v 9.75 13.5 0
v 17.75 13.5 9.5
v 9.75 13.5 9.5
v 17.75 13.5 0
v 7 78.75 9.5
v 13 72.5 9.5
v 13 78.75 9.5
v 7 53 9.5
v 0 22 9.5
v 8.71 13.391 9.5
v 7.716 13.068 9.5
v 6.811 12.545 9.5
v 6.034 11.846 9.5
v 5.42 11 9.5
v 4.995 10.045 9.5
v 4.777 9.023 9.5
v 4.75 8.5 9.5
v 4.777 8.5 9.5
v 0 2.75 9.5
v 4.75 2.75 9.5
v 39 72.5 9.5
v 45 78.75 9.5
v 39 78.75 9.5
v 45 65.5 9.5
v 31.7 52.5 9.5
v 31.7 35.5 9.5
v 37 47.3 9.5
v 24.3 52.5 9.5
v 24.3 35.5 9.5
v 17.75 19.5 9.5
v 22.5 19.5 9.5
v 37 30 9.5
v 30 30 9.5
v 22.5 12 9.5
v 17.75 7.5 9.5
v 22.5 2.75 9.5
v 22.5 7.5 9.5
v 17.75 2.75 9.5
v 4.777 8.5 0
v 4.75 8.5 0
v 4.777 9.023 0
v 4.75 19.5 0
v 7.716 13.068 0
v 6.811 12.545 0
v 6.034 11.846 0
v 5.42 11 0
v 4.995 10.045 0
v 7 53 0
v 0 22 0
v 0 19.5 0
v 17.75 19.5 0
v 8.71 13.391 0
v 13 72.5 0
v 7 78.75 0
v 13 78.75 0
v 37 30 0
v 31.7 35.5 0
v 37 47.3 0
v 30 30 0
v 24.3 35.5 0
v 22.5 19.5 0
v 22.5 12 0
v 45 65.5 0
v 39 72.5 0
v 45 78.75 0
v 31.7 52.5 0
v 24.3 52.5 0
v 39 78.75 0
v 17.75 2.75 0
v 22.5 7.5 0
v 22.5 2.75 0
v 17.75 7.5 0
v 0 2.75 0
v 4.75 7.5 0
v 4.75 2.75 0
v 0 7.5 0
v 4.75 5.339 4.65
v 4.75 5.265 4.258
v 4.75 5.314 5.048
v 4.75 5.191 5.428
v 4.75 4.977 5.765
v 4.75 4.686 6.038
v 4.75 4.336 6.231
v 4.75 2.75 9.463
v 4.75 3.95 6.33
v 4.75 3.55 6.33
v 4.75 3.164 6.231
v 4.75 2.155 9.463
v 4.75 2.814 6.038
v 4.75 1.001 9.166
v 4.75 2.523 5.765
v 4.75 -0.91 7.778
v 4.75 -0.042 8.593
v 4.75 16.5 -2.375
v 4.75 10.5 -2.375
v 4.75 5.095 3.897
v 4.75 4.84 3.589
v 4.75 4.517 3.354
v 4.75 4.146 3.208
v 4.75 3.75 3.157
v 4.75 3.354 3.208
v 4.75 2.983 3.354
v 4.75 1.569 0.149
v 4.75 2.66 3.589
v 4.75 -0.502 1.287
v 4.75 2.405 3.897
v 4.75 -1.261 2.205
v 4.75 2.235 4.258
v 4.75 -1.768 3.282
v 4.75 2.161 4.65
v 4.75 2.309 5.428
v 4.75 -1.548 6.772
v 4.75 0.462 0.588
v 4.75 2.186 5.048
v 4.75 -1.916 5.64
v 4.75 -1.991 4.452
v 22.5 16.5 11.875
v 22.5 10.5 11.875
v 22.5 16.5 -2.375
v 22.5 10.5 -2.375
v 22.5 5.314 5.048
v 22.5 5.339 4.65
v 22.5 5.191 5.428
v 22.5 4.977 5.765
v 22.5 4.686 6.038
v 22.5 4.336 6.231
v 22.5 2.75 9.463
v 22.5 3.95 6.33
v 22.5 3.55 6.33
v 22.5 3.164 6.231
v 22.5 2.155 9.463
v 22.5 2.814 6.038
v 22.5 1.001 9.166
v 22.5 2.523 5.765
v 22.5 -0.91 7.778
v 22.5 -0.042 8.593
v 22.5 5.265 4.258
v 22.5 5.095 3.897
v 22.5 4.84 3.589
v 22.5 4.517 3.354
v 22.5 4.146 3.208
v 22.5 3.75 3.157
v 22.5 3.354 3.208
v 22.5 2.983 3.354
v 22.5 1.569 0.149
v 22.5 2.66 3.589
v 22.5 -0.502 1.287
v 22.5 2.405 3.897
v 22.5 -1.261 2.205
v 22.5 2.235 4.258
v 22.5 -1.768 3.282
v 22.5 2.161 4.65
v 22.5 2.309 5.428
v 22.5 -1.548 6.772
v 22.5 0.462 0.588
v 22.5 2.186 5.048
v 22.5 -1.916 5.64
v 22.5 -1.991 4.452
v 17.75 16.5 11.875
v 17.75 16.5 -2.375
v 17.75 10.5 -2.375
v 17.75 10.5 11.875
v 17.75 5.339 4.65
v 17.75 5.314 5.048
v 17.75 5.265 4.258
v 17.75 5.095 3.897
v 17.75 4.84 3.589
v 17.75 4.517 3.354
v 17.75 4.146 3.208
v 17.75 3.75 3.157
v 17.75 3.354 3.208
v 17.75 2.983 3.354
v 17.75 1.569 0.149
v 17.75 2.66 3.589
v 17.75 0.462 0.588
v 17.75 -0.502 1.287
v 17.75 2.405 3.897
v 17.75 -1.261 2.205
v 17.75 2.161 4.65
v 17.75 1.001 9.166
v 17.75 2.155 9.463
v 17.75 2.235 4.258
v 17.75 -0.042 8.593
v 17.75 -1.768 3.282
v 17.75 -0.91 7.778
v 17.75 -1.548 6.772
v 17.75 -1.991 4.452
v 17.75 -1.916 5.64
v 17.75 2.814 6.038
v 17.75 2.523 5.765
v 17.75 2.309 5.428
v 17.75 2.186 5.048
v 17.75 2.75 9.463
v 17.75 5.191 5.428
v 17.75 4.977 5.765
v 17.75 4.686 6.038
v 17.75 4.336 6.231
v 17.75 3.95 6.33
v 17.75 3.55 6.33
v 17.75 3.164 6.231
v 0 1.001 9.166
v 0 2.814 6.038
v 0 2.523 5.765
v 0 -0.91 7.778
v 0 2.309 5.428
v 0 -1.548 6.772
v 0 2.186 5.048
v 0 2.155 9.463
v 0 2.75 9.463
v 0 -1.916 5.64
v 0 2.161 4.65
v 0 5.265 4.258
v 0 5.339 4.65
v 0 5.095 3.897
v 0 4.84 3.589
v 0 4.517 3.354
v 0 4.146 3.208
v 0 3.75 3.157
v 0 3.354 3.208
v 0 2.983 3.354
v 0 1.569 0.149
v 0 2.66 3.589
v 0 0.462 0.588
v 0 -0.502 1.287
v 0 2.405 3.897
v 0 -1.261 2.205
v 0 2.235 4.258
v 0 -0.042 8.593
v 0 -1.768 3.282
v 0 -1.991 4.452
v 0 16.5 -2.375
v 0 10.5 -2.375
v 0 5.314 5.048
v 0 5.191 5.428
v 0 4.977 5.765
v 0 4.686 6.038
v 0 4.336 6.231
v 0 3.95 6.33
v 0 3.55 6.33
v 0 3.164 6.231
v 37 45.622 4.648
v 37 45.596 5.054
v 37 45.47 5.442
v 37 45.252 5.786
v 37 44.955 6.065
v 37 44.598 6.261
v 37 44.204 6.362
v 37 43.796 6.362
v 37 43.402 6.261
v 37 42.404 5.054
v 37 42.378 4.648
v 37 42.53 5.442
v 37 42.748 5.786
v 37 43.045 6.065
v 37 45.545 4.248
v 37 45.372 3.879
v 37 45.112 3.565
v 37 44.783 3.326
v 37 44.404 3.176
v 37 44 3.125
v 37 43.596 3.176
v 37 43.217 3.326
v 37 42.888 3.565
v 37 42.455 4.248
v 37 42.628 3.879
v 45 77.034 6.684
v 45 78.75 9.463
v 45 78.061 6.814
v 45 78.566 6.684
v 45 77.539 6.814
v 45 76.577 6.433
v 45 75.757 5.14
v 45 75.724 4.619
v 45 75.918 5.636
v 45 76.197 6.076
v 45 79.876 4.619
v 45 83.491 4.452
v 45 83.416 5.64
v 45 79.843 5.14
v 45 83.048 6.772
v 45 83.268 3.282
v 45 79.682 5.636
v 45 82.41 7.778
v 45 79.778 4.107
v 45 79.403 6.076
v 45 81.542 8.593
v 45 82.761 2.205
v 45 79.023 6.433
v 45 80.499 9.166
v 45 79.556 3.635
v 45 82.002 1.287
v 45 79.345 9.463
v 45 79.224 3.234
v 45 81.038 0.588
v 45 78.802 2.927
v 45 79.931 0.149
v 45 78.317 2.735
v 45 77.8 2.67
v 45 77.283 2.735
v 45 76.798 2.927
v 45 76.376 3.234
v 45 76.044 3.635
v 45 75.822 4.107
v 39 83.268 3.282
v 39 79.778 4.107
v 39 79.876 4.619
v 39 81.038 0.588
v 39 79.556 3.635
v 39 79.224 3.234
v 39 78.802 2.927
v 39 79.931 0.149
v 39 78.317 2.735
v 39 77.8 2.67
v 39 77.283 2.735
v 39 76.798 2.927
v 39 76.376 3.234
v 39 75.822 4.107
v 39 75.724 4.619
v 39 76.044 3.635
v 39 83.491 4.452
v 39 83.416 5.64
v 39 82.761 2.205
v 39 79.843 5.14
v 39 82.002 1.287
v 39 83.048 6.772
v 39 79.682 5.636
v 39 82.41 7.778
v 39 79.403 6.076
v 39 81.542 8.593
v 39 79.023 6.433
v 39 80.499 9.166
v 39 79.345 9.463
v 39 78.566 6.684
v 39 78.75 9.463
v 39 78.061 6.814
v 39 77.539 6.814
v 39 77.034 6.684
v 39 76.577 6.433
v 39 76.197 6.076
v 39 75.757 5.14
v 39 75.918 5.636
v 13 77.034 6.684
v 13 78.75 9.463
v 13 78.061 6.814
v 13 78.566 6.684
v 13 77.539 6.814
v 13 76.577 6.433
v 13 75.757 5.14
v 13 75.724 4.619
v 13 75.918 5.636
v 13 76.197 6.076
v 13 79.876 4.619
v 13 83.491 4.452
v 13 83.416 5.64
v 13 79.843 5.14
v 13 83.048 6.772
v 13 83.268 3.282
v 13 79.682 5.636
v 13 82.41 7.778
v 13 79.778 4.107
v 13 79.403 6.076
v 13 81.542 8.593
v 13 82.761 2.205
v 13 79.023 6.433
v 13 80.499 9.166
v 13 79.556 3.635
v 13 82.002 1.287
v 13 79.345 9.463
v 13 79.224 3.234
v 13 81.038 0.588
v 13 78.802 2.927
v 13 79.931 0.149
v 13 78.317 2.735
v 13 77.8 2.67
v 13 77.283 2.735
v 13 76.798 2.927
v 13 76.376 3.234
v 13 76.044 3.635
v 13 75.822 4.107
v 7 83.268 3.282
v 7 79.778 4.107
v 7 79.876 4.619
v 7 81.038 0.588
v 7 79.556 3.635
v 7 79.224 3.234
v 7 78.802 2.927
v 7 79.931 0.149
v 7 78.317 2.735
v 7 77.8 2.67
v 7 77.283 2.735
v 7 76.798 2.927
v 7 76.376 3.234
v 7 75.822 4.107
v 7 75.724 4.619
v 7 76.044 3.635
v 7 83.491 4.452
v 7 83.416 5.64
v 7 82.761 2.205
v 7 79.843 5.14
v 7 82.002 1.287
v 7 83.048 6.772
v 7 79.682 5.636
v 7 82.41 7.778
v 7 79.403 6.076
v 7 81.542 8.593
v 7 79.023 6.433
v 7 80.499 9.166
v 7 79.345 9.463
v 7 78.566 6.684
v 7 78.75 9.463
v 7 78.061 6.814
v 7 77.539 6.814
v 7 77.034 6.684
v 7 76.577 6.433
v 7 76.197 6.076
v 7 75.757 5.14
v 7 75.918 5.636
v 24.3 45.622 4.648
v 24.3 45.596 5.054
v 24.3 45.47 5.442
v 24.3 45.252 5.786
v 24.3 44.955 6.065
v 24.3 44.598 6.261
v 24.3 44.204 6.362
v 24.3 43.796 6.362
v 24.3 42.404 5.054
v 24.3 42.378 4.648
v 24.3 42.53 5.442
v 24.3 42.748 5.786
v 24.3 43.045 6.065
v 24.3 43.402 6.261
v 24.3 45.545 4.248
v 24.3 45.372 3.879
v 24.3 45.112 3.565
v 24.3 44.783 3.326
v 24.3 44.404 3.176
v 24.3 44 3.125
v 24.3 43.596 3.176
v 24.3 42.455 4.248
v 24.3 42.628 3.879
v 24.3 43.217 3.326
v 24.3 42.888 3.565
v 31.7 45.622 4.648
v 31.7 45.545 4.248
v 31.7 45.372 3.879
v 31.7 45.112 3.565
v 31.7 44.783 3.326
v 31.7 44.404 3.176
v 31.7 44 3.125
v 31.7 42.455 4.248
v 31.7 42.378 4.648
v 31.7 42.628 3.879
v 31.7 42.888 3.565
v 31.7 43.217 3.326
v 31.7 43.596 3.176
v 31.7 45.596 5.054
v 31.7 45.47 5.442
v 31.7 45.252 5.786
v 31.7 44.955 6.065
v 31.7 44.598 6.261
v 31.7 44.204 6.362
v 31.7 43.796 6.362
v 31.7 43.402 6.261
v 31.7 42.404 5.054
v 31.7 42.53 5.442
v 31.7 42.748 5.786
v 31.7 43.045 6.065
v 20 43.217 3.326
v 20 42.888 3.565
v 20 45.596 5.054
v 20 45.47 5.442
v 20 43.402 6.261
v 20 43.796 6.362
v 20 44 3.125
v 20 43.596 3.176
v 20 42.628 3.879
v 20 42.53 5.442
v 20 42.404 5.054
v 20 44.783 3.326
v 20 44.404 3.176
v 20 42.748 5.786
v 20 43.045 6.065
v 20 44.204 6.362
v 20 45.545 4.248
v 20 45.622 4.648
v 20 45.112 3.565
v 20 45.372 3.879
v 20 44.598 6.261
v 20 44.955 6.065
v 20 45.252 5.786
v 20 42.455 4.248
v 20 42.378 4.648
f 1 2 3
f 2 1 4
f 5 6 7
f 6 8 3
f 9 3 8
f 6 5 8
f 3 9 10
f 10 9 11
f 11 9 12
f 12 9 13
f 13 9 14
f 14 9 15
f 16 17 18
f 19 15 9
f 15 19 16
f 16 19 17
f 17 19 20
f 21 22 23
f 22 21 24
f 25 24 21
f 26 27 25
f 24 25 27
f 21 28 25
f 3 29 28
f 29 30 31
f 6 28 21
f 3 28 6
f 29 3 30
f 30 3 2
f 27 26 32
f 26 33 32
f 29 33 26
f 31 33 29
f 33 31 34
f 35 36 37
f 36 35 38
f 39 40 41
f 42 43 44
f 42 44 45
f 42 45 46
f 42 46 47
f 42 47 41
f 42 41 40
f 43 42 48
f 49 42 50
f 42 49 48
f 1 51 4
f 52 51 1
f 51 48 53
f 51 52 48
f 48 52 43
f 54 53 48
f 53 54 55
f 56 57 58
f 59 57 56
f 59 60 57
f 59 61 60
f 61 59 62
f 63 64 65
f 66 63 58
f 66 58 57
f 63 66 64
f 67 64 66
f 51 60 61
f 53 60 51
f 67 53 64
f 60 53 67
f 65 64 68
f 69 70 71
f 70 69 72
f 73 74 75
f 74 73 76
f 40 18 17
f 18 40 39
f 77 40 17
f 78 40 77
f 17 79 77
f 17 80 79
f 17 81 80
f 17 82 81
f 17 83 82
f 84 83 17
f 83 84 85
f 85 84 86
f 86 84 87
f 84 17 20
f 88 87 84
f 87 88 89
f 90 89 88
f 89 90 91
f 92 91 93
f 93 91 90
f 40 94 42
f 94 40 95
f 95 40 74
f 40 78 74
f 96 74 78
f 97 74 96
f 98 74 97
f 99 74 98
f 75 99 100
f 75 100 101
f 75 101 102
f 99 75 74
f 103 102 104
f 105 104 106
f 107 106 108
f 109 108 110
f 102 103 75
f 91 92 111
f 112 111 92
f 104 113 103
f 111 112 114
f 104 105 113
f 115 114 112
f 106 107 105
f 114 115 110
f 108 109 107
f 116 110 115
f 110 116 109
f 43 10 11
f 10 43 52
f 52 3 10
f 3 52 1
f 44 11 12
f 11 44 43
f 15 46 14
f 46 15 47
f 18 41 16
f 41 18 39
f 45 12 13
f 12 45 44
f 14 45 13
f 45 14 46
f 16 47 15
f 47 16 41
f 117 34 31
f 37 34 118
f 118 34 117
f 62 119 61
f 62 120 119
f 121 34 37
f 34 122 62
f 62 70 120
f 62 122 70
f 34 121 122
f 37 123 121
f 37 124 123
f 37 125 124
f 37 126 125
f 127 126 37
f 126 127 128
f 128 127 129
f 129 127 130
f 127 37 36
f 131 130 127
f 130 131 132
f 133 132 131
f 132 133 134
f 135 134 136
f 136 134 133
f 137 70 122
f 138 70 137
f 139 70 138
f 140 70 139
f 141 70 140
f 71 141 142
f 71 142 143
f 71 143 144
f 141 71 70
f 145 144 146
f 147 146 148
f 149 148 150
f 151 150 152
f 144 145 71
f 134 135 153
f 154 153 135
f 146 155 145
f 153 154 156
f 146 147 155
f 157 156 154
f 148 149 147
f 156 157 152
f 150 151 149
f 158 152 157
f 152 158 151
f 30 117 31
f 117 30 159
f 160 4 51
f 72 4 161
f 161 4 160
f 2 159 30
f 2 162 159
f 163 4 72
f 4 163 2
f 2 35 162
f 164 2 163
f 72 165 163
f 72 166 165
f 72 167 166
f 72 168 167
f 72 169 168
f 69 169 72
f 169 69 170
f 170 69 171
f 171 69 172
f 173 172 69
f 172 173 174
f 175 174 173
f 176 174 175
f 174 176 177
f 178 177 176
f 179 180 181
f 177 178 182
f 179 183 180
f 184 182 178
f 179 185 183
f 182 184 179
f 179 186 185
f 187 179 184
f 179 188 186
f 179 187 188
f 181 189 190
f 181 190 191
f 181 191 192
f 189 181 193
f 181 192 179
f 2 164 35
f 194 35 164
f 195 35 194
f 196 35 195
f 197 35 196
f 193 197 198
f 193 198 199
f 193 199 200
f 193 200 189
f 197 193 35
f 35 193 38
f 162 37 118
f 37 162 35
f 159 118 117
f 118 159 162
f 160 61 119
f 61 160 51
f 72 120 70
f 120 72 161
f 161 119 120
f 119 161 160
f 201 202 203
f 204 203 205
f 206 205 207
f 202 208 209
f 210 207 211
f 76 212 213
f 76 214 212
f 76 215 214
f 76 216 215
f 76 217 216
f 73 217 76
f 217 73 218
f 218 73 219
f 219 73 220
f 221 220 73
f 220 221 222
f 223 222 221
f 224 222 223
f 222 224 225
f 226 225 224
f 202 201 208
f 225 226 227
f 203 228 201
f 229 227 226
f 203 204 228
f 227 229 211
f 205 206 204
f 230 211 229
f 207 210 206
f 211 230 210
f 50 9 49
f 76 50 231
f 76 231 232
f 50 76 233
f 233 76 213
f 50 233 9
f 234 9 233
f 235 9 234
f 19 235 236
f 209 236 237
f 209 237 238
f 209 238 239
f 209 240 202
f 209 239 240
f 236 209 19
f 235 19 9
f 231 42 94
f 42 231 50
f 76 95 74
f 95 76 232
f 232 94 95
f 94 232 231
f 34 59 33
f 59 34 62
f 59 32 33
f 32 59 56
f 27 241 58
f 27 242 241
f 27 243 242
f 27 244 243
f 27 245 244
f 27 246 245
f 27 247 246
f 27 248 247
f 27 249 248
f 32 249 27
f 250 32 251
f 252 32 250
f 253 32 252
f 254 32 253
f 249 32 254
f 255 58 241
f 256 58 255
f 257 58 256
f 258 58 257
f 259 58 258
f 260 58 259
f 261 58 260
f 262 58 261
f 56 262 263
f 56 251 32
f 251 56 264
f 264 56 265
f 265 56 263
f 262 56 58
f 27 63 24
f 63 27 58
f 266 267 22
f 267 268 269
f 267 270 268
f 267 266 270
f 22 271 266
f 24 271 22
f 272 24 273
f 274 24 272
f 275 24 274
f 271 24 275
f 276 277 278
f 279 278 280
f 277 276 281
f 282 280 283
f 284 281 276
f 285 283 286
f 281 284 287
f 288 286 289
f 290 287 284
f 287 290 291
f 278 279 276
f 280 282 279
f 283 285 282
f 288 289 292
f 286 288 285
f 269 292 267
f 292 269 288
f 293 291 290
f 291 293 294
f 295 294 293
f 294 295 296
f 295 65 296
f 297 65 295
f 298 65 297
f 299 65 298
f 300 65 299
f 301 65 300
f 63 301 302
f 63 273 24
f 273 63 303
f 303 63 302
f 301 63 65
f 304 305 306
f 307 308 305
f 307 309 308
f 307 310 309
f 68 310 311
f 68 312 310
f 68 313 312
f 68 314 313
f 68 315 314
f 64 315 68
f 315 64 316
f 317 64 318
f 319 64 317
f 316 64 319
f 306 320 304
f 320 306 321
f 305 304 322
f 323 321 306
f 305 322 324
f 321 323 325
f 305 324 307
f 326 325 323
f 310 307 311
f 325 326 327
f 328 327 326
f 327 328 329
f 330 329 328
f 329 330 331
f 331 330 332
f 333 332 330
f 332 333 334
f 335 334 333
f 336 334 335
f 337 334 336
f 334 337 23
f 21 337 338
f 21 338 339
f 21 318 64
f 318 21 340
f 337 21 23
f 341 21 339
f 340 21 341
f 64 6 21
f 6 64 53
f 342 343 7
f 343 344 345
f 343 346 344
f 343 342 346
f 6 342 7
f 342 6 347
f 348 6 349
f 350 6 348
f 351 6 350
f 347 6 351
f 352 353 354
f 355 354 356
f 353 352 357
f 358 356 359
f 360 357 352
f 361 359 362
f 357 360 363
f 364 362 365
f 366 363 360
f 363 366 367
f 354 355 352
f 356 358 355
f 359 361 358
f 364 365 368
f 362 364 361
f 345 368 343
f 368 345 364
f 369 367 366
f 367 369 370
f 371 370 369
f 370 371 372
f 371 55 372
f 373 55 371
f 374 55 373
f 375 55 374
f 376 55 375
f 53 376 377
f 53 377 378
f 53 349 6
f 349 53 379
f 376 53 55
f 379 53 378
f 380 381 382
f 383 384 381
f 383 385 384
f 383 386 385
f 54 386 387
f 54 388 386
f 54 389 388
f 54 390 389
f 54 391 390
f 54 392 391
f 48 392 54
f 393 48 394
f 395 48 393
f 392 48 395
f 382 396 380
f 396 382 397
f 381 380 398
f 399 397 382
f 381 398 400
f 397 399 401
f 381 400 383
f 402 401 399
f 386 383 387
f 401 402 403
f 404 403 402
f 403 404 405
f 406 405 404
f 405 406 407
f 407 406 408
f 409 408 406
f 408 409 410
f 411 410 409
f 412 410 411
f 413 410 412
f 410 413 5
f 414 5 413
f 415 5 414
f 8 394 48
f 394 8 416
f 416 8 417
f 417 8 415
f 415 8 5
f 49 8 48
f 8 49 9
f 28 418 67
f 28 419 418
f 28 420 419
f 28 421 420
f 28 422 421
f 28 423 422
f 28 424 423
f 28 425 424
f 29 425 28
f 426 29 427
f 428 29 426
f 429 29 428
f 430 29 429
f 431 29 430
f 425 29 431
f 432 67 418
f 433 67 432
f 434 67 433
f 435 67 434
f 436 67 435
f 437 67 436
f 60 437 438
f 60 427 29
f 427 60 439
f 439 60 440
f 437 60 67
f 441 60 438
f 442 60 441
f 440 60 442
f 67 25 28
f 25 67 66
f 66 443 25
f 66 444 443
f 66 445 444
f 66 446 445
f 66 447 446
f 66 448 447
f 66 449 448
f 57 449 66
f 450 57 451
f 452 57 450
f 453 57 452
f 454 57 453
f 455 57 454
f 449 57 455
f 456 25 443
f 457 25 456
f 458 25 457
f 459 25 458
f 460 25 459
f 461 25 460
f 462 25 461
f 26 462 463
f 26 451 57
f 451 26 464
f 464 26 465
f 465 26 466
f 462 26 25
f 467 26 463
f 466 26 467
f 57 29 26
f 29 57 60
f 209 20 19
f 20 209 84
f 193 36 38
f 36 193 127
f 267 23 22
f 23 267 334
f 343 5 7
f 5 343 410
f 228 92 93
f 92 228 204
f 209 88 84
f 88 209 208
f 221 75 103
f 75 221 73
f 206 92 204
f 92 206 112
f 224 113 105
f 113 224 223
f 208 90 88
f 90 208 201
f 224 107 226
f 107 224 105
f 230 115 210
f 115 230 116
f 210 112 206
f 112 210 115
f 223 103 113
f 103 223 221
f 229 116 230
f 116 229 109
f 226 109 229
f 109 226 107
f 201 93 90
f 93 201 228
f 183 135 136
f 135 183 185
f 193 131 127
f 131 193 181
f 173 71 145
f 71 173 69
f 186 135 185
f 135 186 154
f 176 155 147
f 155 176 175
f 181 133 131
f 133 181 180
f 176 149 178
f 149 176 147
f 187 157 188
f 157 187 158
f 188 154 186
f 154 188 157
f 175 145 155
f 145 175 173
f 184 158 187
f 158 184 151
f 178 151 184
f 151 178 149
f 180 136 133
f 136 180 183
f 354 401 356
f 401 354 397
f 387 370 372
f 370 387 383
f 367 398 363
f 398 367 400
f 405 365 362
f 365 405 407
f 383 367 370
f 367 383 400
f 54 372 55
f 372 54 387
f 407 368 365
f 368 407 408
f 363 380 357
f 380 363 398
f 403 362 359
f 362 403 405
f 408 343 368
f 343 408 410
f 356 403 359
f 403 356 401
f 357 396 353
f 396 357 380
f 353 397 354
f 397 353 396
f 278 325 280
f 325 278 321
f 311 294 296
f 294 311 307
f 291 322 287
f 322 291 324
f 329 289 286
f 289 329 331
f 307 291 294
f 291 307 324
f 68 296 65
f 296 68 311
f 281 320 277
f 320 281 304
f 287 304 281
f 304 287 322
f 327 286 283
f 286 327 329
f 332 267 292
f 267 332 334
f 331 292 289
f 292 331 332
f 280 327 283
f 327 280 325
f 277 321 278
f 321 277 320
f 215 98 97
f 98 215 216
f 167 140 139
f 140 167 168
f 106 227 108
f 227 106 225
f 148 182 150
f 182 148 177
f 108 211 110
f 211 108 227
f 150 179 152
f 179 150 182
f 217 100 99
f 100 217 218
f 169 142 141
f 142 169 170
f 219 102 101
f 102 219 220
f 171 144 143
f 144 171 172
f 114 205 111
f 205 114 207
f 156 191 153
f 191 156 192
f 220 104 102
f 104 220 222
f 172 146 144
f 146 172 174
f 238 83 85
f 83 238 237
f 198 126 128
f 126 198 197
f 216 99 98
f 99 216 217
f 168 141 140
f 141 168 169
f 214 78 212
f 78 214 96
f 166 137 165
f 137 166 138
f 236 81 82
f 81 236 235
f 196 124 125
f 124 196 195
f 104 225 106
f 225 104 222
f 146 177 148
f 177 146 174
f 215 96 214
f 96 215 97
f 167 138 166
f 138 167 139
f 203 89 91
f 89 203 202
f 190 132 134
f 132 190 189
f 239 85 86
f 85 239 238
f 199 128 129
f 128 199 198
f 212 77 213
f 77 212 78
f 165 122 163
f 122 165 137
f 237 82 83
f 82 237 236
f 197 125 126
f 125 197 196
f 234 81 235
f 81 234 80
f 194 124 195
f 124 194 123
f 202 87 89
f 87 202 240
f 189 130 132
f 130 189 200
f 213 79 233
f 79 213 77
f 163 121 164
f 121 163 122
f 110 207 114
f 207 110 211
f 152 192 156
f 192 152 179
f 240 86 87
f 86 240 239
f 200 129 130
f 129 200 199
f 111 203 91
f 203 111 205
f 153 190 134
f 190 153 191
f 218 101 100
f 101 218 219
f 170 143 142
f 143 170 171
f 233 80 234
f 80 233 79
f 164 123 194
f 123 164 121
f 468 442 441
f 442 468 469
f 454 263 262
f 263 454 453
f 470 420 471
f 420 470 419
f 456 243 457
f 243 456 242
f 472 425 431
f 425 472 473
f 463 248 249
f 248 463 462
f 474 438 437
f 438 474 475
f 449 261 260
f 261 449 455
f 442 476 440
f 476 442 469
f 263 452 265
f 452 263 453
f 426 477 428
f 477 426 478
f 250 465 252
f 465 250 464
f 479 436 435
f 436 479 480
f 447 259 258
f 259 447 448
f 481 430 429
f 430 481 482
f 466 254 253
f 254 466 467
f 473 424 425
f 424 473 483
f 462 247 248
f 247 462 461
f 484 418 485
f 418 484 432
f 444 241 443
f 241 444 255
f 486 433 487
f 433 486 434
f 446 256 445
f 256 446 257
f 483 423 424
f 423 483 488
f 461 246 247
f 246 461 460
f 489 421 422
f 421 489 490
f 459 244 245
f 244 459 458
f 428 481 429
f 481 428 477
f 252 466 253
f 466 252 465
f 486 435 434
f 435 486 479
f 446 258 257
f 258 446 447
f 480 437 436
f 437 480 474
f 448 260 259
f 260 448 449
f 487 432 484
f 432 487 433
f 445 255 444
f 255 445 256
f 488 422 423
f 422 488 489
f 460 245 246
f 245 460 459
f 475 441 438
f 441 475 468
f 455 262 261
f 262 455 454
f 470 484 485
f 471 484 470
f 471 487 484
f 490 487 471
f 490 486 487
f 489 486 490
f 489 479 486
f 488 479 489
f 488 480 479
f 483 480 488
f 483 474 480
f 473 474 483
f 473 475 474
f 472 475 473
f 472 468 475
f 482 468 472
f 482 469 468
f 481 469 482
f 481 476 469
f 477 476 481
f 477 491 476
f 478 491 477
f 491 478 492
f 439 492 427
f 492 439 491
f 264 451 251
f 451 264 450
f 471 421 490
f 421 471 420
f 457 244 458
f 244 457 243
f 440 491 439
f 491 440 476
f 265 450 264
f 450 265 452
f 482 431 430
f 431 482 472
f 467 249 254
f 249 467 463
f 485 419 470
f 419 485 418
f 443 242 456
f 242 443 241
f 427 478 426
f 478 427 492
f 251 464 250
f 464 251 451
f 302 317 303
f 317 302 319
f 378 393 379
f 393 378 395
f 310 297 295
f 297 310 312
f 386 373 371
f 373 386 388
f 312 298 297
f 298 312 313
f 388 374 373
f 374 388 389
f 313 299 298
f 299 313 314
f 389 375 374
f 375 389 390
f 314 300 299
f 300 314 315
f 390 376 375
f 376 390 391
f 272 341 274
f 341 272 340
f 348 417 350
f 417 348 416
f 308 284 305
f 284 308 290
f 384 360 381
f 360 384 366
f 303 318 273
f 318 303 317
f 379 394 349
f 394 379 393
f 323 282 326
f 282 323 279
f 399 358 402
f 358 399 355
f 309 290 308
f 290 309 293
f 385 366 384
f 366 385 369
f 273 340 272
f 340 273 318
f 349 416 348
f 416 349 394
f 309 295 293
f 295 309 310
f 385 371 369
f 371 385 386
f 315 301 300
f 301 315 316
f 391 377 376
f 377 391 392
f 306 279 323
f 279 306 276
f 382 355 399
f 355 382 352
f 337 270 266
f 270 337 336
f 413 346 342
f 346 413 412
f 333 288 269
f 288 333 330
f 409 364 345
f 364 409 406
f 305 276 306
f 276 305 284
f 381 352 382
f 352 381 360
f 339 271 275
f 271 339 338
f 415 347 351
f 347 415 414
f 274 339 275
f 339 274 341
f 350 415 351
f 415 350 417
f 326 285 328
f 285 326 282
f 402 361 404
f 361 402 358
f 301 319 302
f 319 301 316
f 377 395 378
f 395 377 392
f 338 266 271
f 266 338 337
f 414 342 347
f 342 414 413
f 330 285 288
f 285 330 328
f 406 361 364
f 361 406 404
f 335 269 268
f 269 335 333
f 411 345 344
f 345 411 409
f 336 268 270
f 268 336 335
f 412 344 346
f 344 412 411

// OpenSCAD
// Traxxas Slash A Arm
//
// Replacement front A arm for the Traxxas Slash RC car.
// Parameters can be modified to use this A arm for the rear, or
// for other cars.
// (...it might need additional work to be used for the rear)
//
// V1 -> V2
// After driving with V1 for a while, printed in ABS,
// the A arm broke where it connects to the wheel. The back 
// connection snapped off (the whole little arm), and the front
// one split between layers, and the shaft got out. I made the following
// changes to these little arms
//      - For the front arm, the top is strengthened
//      - For the back arm, the inside was filleted
//      - For both, the bottom side was strengthened
//      - For both, the part holding the shaft was extended toward the wheel
//          (on the wheel side of the shaft - i.e. it's thicker)
//      - The dimension rodOneStraightTwo was created to move the vertex near
//          the back rod-one arm
//      - The dimension rodThreeVertex was created to move the vertex near 
//          the front rod three arm
//
// Daniel Winker, February 28, 2023

// Holes were coming out too small, so I added this multiplier
holeMult = 1.3;

// The long dimension
length = 83.5;

// The smallest dimension
thickness = 9.5;

// The largest width dimension; the "base of the A"
widest = 38;

// The narrowest width dimension; the "top of the A"
narrowest = 22.5;

// The "base of the A" is offset forward from the "top of the A" by this much
offset = 7.0;

// Forward distance between the "top of the A" and the shock-rod screwhead
shockRodOffset = 37.0;

// There are three rods going through the part
// They are referred to as one, two, and three
// One is by the wheel, two is for the shock, three is on the chassis
// Holes for the rods will be centered on the thickness axis, positioned
//    by 'Pos' on the length axis (0 is closest to rod 1), and go all 
//    the way through the other axis...except rod 2, which won't go all the way
// 'MountWidth' is the gap left by the pieces holding the rod.
// CutoutLength is the size of the gap left by the pieces holding the rod, along the length axis. Perpendicular to 'MountWidth'
// 'Inset' is unique to rod two, because it is not symmetrically placed like
//    the other two.
// 'HeadDia' is also unique to it (diameter of the screw head)
rodOneDia = 2.45 * holeMult;  // Actually the diameter of the hole, not the rod
rodOnePos = 3.75;
rodOneMountWidth = 13.0;
rodOneCutoutLength = 13.5;
rodOneBracketWidth = (narrowest-rodOneMountWidth)/2;

rodTwoDia = 2.5 * holeMult;
rodTwoPos = 44.0;
rodTwoMountWidth = 7.4;  // This should be 6.5, but it was printing almost 1mm small for me
rodTwoCutoutLength = 17.0;
rodTwoInset = 5.3;  // This should be larger...but it was printing ~1mm large for me
rodTwoHeadDia = 5.5;
rodTwoLen = 17;  // Length of the screw

rodThreeDia = 3.2 * holeMult;
rodThreePos = 77.8;
rodThreeMountWidth = 26;
rodThreeCutoutLength = 11.0;
rodThreeVertex = 18.0;  // Added in V2; position of the vertex from the end.
rodThreeBracketWidth = (widest - rodThreeMountWidth) / 2;

// I didn't have good ways to name these or describe them
// The arms holding the wheel-rod are straight for a bit before the A arm
// angles off - how long are those straight segments?
rodOneStraight = 12;
rodOneStraightTwo = 22;  // Added in V2
// On the front side of the arm, after the straight section, there's an
// angled section. What is the offset of the top of it?
angleOffset = 30;
// And what is the 'length' position of the top of it?
angleLen = 30;
// On the back section of the arm, there's a vertex near the car side (rod 3);
// what is the position of this in the length direction?
finalVertex = 53;

// V2 Values
// These specify the additions made in version 2
topReinforcementHeight = thickness * 0.25;
topReinforcementLength = rodOneStraight;
bottomReinforcementHeight = thickness * 0.25;
bottomReinforcementLength = rodOneStraight;
filletRadius = 5;
shaftReinforcementLength = 2;

// Draw a prism based on a right angled triangle
// l - length of prism
// w - width of triangle
// h - height of triangle
// https://github.com/dannystaple/OpenSCAD-Parts-Library/blob/master/prism.scad
module prism(l, w, h) {
       polyhedron(points=[
               [0,0,h],           // 0    front top corner
               [0,0,0],[w,0,0],   // 1, 2 front left & right bottom corners
               [0,l,h],           // 3    back top corner
               [0,l,0],[w,l,0]    // 4, 5 back left & right bottom corners
       ], faces=[ // points for all faces must be ordered clockwise when looking in
               [0,2,1],    // top face
               [3,4,5],    // base face
               [0,1,4,3],  // h face
               [1,2,5,4],  // w face
               [0,3,5,2],  // hypotenuse face
       ]);
}

// Create a 2D outline of the A arm then extrude it upwards
// This includes the cutout for the shock
// (Making it a module to organize the code)
module drawAARm() {
    linear_extrude(height=thickness, convexity=10, slices=20, scale=1.0, $fn=16) {
        polygon(points=[[0,0],
                        [rodOneBracketWidth,0],
                        [rodOneBracketWidth,rodOneCutoutLength],
                        [rodOneBracketWidth+rodOneMountWidth,rodOneCutoutLength],
                        [rodOneBracketWidth+rodOneMountWidth,0],
                        [narrowest,0],
                        [narrowest,rodOneStraight],
                        [angleOffset,angleLen],
                        [shockRodOffset,angleLen],
                        [shockRodOffset,rodTwoPos+0.6*rodTwoHeadDia],
                        [widest+offset,length-rodThreeVertex],
                        [widest+offset,length],
                        [widest+offset-rodThreeBracketWidth,length],
                        [widest+offset-rodThreeBracketWidth,length-rodThreeCutoutLength],
                        [offset+rodThreeBracketWidth,length-rodThreeCutoutLength],
                        [offset+rodThreeBracketWidth,length],
                        [offset,length],
                        [offset,finalVertex],
                        [0,rodOneStraightTwo],
                        // The points above are the outline
                        // The points below are the cutout for the shock
                        [shockRodOffset-rodTwoInset,rodTwoPos-rodTwoCutoutLength/2],
                        [shockRodOffset-rodTwoInset,rodTwoPos+rodTwoCutoutLength/2],
                        [shockRodOffset-rodTwoInset-rodTwoMountWidth,rodTwoPos+rodTwoCutoutLength/2],
                        [shockRodOffset-rodTwoInset-rodTwoMountWidth,rodTwoPos-rodTwoCutoutLength/2]],
                        // The below says the first set of points is for the outline
                        // and the second set is for the cutout
                        paths=[[0,1,2,3,4,5,6,7,8,9,10,11,12,13,14,15,16,17,18],
                               [19,20,21,22]]);
    }
}

// The A arm, from the module, has sharp 90-degree angles everywhere
// We want the end bits where the shafts go to be rounded
// So we cut off the rectangular bits, and draw in cylinders
// We also cut out holes for the shafts/rods
difference() {
    union() {
        // Cut out the 90-degree parts
        difference() {
            union() {
                drawAARm();
                
                // V2 Change: Add extra material on the wheel-side of
                // the A arm to strengthen the "rod one arm"
                rodOneArmWidth = (narrowest-rodOneMountWidth)/2;
                translate([0, -shaftReinforcementLength, 0]) {
                    cube([rodOneArmWidth,shaftReinforcementLength,thickness]);
                }
                translate([rodOneMountWidth+rodOneArmWidth, 
                            -shaftReinforcementLength, 0]) {
                    cube([(narrowest-rodOneMountWidth)/2,
                            shaftReinforcementLength,thickness]);
                }
                
                // V2 Change: Fillet the inside of the rod 1 holder
                // Only the back part of it; the front requires 
                // more clearance
                // (Draw a block, cut a cylinder out of the block)
                translate([rodOneArmWidth+filletRadius,rodOneCutoutLength-filletRadius,0]) {    
                    rotate([0, 0, 90]) {
                        difference() {
                            cube([filletRadius, filletRadius, thickness]);
                            cylinder(r=filletRadius, h=thickness, $fn=30);
                        }
                    }
                }
                
                // V2 Change: Add reinforcement on top of the front rod 1 holder arm
                translate([rodOneMountWidth+rodOneArmWidth, rodOneCutoutLength-topReinforcementLength/4, thickness]) {
                    translate([rodOneArmWidth, topReinforcementLength*0.5, 0]) {
                        rotate([0, 0, 90]) {
                            prism(rodOneArmWidth, topReinforcementLength*0.25, topReinforcementHeight);
                        }
                    }
                    rotate([0, 0, -90]) {
                        prism(rodOneArmWidth, topReinforcementLength*0.25, topReinforcementHeight);
                    }
                    cube([rodOneArmWidth, topReinforcementLength*0.5, topReinforcementHeight]);
                }
                
                // V2 Change: Add reinforcement under the front rod 1 holder arm
                translate([rodOneMountWidth+rodOneArmWidth, rodOneCutoutLength-topReinforcementLength/4, -bottomReinforcementHeight]) {
                    translate([0, topReinforcementLength*0.5, bottomReinforcementHeight]) {
                        rotate([180, 0, 90]) {
                            prism(rodOneArmWidth, topReinforcementLength*0.25, topReinforcementHeight);
                        }
                    }
                    translate([rodOneArmWidth, 0, bottomReinforcementHeight]) {
                        rotate([180, 0, -90]) {
                            prism(rodOneArmWidth, topReinforcementLength*0.25, topReinforcementHeight);
                        }
                    }
                    cube([rodOneArmWidth, topReinforcementLength*0.5, topReinforcementHeight]);
                }
                
                // V2 Change: Add reinforcement under the front rod 1 holder arm
                translate([0, rodOneCutoutLength-topReinforcementLength/4, -bottomReinforcementHeight]) {
                    translate([0, topReinforcementLength*0.5, bottomReinforcementHeight]) {
                        rotate([180, 0, 90]) {
                            prism(rodOneArmWidth, topReinforcementLength*0.25, topReinforcementHeight);
                        }
                    }
                    translate([rodOneArmWidth, 0, bottomReinforcementHeight]) {
                        rotate([180, 0, -90]) {
                            prism(rodOneArmWidth, topReinforcementLength*0.25, topReinforcementHeight);
                        }
                    }
                    cube([rodOneArmWidth, topReinforcementLength*0.5, topReinforcementHeight]);
                }
                
            }
            union() {
                translate([0, -shaftReinforcementLength, 0]) {
                    cube([widest, thickness/2, thickness]);  // The small end
                }
                translate([0, length-thickness/2, 0]) {
                    cube([widest+offset, thickness/2, thickness]);  // The large end
                }
            }
        }
        // Add in the cylinders
        // On the small end
        translate([0, thickness/2-shaftReinforcementLength, thickness/2]) {
            rotate([0, 90, 0]) {
                cylinder(r=thickness/2, h=rodOneBracketWidth, $fn=25);
            }
        }
        translate([rodOneMountWidth+rodOneBracketWidth, thickness/2-shaftReinforcementLength, thickness/2]) {
            rotate([0, 90, 0]) {
                cylinder(r=thickness/2, h=rodOneBracketWidth, $fn=25);
            }
        }
        // On the big end
        translate([offset, length-thickness/2, thickness/2]) {
            rotate([0, 90, 0]) {
                cylinder(r=thickness/2, h=rodThreeBracketWidth, $fn=25);
            }
        }
        translate([rodThreeMountWidth+rodThreeBracketWidth+offset, length-thickness/2, thickness/2]) {
            rotate([0, 90, 0]) {
                cylinder(r=thickness/2, h=rodThreeBracketWidth, $fn=25);
            }
        }
    }
    
    // Cut out the shaft holes
    union() {
        translate([(widest+offset)/2,rodOnePos,thickness/2]) {
            rotate([0, 90, 0]) {
                cylinder(r=rodOneDia/2, h=widest+offset, center=true, $fn=25);
            }
        }
        translate([(widest+offset)/2+shockRodOffset-rodTwoLen,rodTwoPos,thickness/2]) {
            rotate([0, 90, 0]) {
                cylinder(r=rodTwoDia/2, h=widest+offset, center=true, $fn=25);
            }
        }
        translate([(widest+offset)/2,rodThreePos,thickness/2]) {
            rotate([0, 90, 0]) {
                cylinder(r=rodThreeDia/2, h=widest+offset, center=true, $fn=25);
            }
        }
    }
}
